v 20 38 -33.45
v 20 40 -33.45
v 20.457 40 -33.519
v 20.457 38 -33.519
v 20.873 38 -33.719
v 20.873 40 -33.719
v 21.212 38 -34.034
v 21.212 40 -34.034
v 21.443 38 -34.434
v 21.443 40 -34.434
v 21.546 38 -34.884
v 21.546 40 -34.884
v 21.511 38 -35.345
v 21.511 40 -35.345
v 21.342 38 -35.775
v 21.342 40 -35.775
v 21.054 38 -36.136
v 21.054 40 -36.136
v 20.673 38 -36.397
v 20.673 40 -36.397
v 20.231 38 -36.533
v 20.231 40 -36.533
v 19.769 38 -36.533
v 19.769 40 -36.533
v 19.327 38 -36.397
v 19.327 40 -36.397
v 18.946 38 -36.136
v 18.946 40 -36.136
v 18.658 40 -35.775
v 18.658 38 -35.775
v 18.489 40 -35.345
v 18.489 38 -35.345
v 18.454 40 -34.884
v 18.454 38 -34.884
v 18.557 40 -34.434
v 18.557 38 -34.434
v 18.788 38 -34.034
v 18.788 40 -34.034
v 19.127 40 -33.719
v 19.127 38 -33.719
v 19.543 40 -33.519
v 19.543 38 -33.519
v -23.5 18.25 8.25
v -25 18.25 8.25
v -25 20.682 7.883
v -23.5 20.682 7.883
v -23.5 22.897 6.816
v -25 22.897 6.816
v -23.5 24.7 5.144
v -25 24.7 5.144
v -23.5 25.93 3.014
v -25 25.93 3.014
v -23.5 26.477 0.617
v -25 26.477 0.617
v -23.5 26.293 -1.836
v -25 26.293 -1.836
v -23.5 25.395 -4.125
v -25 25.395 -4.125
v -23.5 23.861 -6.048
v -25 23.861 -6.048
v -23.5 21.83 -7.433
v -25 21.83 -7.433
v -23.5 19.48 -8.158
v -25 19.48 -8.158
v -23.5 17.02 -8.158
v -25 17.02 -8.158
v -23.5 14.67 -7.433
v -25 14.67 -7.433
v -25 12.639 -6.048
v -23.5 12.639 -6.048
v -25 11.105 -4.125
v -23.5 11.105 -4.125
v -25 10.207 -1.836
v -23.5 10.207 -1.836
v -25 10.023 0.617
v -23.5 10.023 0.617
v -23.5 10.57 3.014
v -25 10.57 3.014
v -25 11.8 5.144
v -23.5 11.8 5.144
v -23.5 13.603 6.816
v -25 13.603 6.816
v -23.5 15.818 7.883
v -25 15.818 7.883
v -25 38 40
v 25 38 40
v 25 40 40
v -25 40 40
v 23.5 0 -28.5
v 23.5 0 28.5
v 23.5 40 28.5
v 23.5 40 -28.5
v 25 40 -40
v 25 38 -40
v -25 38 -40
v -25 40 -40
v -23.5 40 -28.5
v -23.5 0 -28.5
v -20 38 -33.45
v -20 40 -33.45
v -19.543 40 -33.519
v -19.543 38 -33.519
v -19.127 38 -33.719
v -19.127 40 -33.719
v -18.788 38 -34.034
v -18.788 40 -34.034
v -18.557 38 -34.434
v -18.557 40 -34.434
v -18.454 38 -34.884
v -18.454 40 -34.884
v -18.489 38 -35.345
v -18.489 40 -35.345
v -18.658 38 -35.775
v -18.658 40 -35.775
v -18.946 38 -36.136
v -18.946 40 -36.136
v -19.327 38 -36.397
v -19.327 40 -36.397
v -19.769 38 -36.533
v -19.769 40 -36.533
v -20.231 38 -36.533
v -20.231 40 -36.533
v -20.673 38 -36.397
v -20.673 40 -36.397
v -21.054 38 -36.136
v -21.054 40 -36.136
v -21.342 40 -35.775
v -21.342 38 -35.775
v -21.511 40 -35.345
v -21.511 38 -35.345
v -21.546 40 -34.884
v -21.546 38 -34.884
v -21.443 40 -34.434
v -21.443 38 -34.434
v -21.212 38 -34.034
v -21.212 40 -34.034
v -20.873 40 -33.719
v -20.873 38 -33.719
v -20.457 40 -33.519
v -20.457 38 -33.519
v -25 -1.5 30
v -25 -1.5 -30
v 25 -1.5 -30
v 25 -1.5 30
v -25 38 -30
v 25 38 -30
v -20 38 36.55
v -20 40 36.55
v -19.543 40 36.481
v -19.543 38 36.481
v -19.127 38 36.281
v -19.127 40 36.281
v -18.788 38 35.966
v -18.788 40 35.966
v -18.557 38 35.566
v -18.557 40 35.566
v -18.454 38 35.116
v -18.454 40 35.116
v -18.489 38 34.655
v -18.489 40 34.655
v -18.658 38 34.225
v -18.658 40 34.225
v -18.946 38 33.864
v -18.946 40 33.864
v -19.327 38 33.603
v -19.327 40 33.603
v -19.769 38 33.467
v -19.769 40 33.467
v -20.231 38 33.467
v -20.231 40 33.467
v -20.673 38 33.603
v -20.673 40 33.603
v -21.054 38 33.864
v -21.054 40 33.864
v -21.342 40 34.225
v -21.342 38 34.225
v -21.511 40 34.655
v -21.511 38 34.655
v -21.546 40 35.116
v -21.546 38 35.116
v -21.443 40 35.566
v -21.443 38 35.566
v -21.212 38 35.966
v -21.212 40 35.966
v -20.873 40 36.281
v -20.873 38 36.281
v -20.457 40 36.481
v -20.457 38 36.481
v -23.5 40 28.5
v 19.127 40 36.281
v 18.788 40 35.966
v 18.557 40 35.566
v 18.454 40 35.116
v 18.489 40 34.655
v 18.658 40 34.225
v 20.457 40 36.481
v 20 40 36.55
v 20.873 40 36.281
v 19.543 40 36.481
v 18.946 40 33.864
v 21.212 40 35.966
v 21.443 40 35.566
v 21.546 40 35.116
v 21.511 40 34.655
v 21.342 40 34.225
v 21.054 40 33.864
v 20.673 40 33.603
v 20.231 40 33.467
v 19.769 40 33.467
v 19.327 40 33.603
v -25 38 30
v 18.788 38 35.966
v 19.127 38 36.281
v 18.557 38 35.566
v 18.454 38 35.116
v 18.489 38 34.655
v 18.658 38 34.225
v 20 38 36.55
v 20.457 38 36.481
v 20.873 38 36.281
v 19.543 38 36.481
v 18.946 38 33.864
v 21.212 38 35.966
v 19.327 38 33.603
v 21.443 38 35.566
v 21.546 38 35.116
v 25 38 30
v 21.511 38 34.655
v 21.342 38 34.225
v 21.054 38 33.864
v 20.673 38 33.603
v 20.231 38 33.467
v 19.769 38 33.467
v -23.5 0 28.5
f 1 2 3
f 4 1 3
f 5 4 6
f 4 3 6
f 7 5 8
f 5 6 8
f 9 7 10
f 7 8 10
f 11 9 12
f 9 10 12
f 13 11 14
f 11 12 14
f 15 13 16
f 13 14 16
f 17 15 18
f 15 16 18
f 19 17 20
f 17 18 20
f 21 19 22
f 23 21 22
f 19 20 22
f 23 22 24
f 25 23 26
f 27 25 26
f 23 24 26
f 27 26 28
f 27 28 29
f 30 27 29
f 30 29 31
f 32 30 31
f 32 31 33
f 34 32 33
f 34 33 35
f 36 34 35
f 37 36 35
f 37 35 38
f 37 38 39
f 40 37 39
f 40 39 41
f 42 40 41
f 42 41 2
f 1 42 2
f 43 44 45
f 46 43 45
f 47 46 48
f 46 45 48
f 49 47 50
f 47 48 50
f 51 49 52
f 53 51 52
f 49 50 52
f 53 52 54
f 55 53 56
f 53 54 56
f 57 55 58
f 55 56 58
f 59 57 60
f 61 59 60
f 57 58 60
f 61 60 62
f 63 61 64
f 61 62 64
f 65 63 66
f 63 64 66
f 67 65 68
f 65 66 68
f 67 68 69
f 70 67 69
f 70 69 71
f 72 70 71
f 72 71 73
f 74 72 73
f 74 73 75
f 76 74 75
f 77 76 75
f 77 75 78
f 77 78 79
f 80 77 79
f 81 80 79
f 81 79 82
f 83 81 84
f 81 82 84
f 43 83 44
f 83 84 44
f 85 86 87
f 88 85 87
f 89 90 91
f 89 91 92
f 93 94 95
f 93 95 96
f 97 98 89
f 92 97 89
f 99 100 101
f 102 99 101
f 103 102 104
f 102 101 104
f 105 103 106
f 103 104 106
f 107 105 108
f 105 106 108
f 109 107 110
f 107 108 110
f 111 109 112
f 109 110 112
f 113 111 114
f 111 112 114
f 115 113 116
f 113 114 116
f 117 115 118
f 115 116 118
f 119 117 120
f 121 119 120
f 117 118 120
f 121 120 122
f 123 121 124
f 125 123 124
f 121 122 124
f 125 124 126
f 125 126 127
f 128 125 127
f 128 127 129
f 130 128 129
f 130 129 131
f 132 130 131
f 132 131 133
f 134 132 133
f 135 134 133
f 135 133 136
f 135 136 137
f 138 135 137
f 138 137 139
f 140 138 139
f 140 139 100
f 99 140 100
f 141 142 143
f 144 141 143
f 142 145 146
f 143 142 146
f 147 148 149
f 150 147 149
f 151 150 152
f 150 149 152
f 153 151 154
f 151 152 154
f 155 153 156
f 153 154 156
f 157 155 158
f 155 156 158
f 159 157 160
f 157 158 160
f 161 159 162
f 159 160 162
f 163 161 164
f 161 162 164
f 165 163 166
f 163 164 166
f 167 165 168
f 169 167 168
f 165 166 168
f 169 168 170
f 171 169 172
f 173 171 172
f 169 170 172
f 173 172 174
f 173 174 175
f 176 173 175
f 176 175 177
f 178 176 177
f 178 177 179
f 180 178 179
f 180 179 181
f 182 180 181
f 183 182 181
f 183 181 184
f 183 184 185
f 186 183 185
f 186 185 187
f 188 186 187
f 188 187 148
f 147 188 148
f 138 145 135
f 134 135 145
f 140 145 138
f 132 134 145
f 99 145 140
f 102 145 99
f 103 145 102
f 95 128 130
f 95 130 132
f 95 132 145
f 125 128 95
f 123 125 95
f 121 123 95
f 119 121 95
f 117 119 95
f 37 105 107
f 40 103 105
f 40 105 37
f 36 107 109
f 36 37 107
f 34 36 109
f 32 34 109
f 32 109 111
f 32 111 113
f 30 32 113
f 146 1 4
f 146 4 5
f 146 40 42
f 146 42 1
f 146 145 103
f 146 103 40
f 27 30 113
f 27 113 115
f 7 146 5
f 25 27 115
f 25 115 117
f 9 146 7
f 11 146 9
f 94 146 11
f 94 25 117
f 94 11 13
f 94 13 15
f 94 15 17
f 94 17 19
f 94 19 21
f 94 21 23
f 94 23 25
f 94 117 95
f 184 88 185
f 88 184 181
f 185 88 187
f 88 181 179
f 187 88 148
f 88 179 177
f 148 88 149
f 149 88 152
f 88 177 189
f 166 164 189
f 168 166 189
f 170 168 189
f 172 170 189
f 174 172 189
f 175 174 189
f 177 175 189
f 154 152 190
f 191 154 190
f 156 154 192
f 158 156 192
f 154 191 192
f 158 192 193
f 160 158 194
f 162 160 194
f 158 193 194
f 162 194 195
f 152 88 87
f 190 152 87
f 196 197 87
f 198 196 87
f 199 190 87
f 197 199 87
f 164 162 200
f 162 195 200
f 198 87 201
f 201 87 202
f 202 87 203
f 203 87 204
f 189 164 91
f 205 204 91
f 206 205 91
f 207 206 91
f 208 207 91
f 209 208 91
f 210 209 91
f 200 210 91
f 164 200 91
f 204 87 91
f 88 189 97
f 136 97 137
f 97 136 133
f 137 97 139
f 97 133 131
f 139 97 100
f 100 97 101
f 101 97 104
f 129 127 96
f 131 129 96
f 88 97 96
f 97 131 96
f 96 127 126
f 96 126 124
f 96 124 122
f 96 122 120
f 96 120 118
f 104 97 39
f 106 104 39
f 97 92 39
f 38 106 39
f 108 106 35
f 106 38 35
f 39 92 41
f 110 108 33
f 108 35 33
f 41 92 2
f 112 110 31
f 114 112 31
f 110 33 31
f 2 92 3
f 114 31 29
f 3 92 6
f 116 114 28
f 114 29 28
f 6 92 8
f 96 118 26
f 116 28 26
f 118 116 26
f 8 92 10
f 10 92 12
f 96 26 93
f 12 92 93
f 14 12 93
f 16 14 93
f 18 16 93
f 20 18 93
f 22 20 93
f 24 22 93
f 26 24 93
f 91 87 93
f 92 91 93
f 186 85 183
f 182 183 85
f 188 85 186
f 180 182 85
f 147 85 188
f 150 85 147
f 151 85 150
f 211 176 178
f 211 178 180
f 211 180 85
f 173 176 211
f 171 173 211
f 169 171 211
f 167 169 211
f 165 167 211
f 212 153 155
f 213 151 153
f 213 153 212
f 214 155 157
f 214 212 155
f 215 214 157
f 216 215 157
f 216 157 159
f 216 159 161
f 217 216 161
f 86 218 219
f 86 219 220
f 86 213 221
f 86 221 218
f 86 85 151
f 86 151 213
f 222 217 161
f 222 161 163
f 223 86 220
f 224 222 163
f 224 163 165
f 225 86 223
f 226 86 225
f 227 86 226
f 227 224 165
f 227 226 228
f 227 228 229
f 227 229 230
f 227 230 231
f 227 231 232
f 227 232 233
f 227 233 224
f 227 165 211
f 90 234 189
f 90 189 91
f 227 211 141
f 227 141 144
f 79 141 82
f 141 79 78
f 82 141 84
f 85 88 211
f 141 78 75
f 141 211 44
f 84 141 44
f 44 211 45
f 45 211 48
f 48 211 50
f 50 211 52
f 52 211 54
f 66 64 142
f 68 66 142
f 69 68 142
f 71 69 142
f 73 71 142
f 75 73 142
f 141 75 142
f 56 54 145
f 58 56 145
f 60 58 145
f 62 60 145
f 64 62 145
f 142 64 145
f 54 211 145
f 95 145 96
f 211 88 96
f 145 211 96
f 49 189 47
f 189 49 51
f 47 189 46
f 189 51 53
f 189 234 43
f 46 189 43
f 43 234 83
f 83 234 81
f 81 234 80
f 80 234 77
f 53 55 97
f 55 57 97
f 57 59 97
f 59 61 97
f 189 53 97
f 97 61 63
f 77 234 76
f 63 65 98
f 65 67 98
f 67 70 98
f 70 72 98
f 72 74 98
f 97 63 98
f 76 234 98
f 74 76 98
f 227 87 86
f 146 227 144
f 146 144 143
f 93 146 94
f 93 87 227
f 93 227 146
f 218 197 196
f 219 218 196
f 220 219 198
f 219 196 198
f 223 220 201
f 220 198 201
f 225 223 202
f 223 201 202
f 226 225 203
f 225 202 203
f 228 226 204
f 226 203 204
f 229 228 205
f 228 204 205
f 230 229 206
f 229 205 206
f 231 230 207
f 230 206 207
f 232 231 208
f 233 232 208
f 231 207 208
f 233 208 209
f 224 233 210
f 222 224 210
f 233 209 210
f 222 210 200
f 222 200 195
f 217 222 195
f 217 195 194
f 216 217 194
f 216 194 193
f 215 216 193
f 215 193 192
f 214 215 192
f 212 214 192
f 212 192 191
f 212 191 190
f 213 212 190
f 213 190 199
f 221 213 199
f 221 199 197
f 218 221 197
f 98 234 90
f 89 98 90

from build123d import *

# Parameters (mm, degrees)
SKETCH1_W           = 50
SKETCH1_H           = 60
SKETCH1_W_2         = 47
SKETCH1_H_2         = 57
BOSS_EXTRUDE6_DEPTH = 40
SKETCH7_W           = 50
SKETCH7_H           = 60
BOSS_EXTRUDE8_DEPTH = 1.5
SKETCH8_W           = 10
SKETCH8_H           = 2
BOSS_EXTRUDE9_DEPTH = 50
SKETCH9_R           = 1.55
CUT_EXTRUDE1_DEPTH  = 3
SKETCH11_R          = 8.25
CUT_EXTRUDE3_DEPTH  = 1.5


with BuildPart() as part:
    # Sketch1 → Boss-Extrude6 (new body)
    with BuildSketch(Plane(origin=(0, 0, 0), x_dir=(1, 0, 0), z_dir=(0, 1, 0))):
        Rectangle(SKETCH1_W, SKETCH1_H)
        Rectangle(SKETCH1_W_2, SKETCH1_H_2, mode=Mode.SUBTRACT)
    extrude(amount=BOSS_EXTRUDE6_DEPTH)

    # Sketch7 → Boss-Extrude8 (add)
    with BuildSketch(Plane.XZ):
        Rectangle(SKETCH7_W, SKETCH7_H)
    extrude(amount=BOSS_EXTRUDE8_DEPTH)

    # Sketch8 → Boss-Extrude9 (add)
    with BuildSketch(Plane(origin=(25, 0, 0), x_dir=(0, 0, -1), z_dir=(1, 0, 0))):
        with Locations((-35, 39)):
            Rectangle(SKETCH8_W, SKETCH8_H)
        with Locations((35, 39)):
            Rectangle(SKETCH8_W, SKETCH8_H)
    extrude(amount=-BOSS_EXTRUDE9_DEPTH)

    # Sketch9 → Cut-Extrude1 (cut)
    with BuildSketch(Plane(origin=(0, 40, 0), x_dir=(1, 0, 0), z_dir=(0, 1, 0))):
        with Locations(Location((-20, 35, 0), (0, 0, 270))):
            Circle(SKETCH9_R)
        with Locations(Location((20, 35, 0), (0, 0, 270))):
            Circle(SKETCH9_R)
        with Locations(Location((20, -35, 0), (0, 0, 270))):
            Circle(SKETCH9_R)
        with Locations(Location((-20, -35, 0), (0, 0, 270))):
            Circle(SKETCH9_R)
    extrude(amount=-CUT_EXTRUDE1_DEPTH, mode=Mode.SUBTRACT)

    # Sketch11 → Cut-Extrude3 (cut)
    with BuildSketch(Plane.ZY.offset(25)):
        with Locations((0, 18.25)):
            Circle(SKETCH11_R)
    extrude(amount=-CUT_EXTRUDE3_DEPTH, mode=Mode.SUBTRACT)


solid = part.part
